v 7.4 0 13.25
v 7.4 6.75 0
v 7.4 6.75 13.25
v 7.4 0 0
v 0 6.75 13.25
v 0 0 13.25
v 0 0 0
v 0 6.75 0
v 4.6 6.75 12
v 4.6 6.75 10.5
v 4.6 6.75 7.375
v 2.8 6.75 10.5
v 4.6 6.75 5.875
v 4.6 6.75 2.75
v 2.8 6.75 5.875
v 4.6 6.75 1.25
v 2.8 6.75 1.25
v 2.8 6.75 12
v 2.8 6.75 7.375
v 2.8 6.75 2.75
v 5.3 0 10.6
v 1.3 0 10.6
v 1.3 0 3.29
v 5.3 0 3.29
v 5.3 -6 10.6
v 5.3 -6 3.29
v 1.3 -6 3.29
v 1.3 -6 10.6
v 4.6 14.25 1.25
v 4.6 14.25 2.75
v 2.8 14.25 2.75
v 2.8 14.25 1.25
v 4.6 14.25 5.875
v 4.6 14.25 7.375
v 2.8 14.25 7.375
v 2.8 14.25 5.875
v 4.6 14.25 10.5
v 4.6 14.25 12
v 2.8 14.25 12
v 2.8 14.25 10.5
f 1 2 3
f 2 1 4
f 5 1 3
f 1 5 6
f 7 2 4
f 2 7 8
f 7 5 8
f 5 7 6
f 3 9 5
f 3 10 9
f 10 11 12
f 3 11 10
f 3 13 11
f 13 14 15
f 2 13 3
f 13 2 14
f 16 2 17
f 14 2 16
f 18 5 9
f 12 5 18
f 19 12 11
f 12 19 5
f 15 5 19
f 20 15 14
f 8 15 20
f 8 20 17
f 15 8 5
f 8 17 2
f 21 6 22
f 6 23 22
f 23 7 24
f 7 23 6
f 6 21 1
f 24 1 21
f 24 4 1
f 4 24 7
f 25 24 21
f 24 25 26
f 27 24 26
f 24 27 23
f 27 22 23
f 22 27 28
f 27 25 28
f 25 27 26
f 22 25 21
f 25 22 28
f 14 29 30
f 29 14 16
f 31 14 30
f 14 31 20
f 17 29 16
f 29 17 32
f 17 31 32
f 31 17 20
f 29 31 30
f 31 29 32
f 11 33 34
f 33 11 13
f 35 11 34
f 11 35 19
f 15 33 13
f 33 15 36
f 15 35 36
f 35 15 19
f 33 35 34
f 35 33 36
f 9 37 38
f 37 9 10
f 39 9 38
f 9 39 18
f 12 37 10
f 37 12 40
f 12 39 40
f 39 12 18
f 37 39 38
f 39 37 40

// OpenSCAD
// file: ../lib/utils.scad
///< Utilities

function rand_clr() = rands( 0,1,3 );

///< Length conversions
function in2mm( i ) = ( i * 25.4 ); 
function mm2in( m ) = ( m / 25.4 );

/// This is pulled from stackoverflow
/// https://stackoverflow.com/questions/45826208/openscad-rotating-around-a-particular-point

// rotate as per a, v, but around point pt
module rotate_about_pt(z, y, pt) {
    translate(pt)
        rotate([0, y, z ])
            translate(-pt)
                children();   
}

function adjust_z_offset( v, z ) = [for (i=[0:(len(v)-1)]) v[i]+[0,0,z]] ;

///< For each child, translate child by <p> point in points
module foreach_translate(points ){
	for (p=points){
		translate(p) children();
	}
}
// file: ../lib/math.scad
///< Math scad module


///< Find the hypotenuse from two sides of a right triangle
function hyp_from_sides( a, b ) = sqrt( pow( a, 2 ) + pow( b, 2 ) );

///< Find equal sides from hypotenuse of a right triangle
function sides_from_hyp(h) = sqrt( pow( h, 2 ) / 2 );

///< Find A from hypotenuse and B
function a_from_hb( h, b ) = sqrt( pow( h, 2 ) - pow( b, 2 ) );

function dist_2d( pt2, pt1 ) = sqrt(pow(( pt2[0]-pt1[0] ),2) + pow(( pt2[1]-pt1[1]),2) );

function mid_pt_2d( pt2, pt1 ) = [( pt1[0]+pt2[0] )/2, ( pt1[1]+pt2[1] )/2, 0 ];

function opposite_side_th( theta, hypotenuse ) = sin( theta )*hypotenuse ;
function adjacent_side_th( theta, hypotenuse ) = cos( theta )*hypotenuse ;

///< Test for math functions

A = 3;
B = 4;
echo("Given A=", A, "and B=", B );
H = hyp_from_sides( A, B );
echo("Hypotenuse=", H );
echo("Calc Correct = ", (H == 5) );

echo("Given H=", H, " which is a hypotenuse with equal sides" );
echo( "the sides=", sides_from_hyp( H ) );

echo("Given H=", H, "B=", 4 );
echo("A=", a_from_hb( H, 4 ) );

echo("Distance from [-1,1] and [3,4] = ", dist_2d( [-1,1],[3,4]) );

echo( "Opposite = ", opposite_side_th( 39.0, 30 ), "Theta = ", 39.0, "Hypotenuse = ", 30 );
echo( "Adjacent = ", adjacent_side_th( 60.0, 10 ), "Theta = ", 60.0, "Hypotenuse = ", 10 );

///< Find the sum of a vector <vect> starting from <s> and continuing to <i>
function sumv( vect, i, s=0 ) = ( i == s ? vect[ i ] : vect[ i ] + sumv( vect, i - 1, s ) );
vec = [ 1, 2, 3, 4 ];
l = len( vec )-1;
echo( "Sum vec = ", sumv( vec, l, 0 ) );

///< Find the average of a vector <vect> starting at <s>
function average( vect, s=0 ) = (len( vect ) == 0 ? 0 : ( sumv( vect, len( vect ) - 1, s )/len(vect) ) );
echo( "Ave vec = ", average( vec ) );
vec2 = [];
echo( "Ave vec2 = ", average( vec2 ) );
// main file
///< Object definition
use <../lib/math.scad>;
use <../lib/utils.scad>;


/*
Module: Neo Queen Serenity Wand Adapter
*/

/*
Parameters
*/

// X Position
x = 1; // [0:1:100]
// Y Position
y = 1; // [0:1:100]
// Z Position
z = 1; // [0:1:100]
// Width
w = 1; // [0:1:100]
// Depth
d = 1; // [0:1:100]
// Height
h = 1; // [0:1:100]

///< Parameters after this are hidden from the customizer
module __Customizer_Limit__(){}
thickness       = 1.0;  // Thickness
leads_r         = 1.25; // [0:0.01:5]
cr2032_h        = 3.25; // [0:1:100]
cr2032_r        = 10.00;// [0:1:100]
cr2032_d        = cr2032_r * 2;
led_lamp_h      = 2.0;  // [0:0.1:10]
led_lamp_d      = 4.0;  // [0:0.1:4 ]
led_rim_d       = 4.25; // [0:0.1:4 ]
led_rim_h       = 1.0;  // [0:0.1:4 ]
led_retainer_r  = thickness*2+led_rim_d/2.0+0.5;
led_h           = led_lamp_h + led_rim_h + led_lamp_d/2;

spdt_body_w     = 7.40; // [0:0.1:15]
spdt_body_d     = 5.75;  // [0:0.1:15]
spdt_body_h     = 13.25;// [0:0.1:15]
spdt_lead_w     = 1.3+0.50; // [0:0.1:15]
spdt_lead_d     = 7.0+0.50; // [0:0.1:15]
spdt_lead_h     = 1.0+0.50; // [0:0.1:15]
spdt_sw_w       = 6.0; // [0:0.1:15]
spdt_sw_d       = 4.0; // [0:0.1:15]
spdt_sw_h       = 4.0; // [0:0.1:15]


///< Modules
module led(){
    translate([0,0,led_rim_h+led_lamp_h])
        color("white")
        sphere( r = led_lamp_d/2.0 );
    translate([0,0,led_rim_h])
        color("white")
        cylinder( h = led_lamp_h, r = led_lamp_d/2.0 );
    color("white")
    cylinder( h = led_rim_h, r = led_rim_d/2.0 );
}

module spdt_switch(){
    tol = 0.0;
    color("silver")
        cube( [spdt_body_w, spdt_body_d+thickness, spdt_body_h] );
    translate([1.3,-spdt_sw_w,3.29])
        color("black")
        cube( [spdt_sw_d+tol,spdt_sw_w+tol, spdt_sw_h+tol ]);
    translate([1.3,-spdt_sw_w,6.6])
        color("cyan")
        cube( [spdt_sw_d+tol,spdt_sw_w+tol, spdt_sw_h+tol ]);

    /// Terminals
    translate([spdt_body_w/2,
               spdt_body_d+thickness+spdt_lead_d/2,
               2])
        color("gold")
        cube( [ spdt_lead_w, spdt_lead_d, spdt_lead_h ], true );
    translate([spdt_body_w/2,
               spdt_body_d+thickness+spdt_lead_d/2,
               spdt_body_h/2])
        color("gold")
        cube( [ spdt_lead_w, spdt_lead_d, spdt_lead_h ], true );
    translate([spdt_body_w/2,
               spdt_body_d+thickness+spdt_lead_d/2,
               spdt_body_h-2])
        color("gold")
        cube( [ spdt_lead_w, spdt_lead_d, spdt_lead_h ], true );

}


///< Build object
spdt_switch();
